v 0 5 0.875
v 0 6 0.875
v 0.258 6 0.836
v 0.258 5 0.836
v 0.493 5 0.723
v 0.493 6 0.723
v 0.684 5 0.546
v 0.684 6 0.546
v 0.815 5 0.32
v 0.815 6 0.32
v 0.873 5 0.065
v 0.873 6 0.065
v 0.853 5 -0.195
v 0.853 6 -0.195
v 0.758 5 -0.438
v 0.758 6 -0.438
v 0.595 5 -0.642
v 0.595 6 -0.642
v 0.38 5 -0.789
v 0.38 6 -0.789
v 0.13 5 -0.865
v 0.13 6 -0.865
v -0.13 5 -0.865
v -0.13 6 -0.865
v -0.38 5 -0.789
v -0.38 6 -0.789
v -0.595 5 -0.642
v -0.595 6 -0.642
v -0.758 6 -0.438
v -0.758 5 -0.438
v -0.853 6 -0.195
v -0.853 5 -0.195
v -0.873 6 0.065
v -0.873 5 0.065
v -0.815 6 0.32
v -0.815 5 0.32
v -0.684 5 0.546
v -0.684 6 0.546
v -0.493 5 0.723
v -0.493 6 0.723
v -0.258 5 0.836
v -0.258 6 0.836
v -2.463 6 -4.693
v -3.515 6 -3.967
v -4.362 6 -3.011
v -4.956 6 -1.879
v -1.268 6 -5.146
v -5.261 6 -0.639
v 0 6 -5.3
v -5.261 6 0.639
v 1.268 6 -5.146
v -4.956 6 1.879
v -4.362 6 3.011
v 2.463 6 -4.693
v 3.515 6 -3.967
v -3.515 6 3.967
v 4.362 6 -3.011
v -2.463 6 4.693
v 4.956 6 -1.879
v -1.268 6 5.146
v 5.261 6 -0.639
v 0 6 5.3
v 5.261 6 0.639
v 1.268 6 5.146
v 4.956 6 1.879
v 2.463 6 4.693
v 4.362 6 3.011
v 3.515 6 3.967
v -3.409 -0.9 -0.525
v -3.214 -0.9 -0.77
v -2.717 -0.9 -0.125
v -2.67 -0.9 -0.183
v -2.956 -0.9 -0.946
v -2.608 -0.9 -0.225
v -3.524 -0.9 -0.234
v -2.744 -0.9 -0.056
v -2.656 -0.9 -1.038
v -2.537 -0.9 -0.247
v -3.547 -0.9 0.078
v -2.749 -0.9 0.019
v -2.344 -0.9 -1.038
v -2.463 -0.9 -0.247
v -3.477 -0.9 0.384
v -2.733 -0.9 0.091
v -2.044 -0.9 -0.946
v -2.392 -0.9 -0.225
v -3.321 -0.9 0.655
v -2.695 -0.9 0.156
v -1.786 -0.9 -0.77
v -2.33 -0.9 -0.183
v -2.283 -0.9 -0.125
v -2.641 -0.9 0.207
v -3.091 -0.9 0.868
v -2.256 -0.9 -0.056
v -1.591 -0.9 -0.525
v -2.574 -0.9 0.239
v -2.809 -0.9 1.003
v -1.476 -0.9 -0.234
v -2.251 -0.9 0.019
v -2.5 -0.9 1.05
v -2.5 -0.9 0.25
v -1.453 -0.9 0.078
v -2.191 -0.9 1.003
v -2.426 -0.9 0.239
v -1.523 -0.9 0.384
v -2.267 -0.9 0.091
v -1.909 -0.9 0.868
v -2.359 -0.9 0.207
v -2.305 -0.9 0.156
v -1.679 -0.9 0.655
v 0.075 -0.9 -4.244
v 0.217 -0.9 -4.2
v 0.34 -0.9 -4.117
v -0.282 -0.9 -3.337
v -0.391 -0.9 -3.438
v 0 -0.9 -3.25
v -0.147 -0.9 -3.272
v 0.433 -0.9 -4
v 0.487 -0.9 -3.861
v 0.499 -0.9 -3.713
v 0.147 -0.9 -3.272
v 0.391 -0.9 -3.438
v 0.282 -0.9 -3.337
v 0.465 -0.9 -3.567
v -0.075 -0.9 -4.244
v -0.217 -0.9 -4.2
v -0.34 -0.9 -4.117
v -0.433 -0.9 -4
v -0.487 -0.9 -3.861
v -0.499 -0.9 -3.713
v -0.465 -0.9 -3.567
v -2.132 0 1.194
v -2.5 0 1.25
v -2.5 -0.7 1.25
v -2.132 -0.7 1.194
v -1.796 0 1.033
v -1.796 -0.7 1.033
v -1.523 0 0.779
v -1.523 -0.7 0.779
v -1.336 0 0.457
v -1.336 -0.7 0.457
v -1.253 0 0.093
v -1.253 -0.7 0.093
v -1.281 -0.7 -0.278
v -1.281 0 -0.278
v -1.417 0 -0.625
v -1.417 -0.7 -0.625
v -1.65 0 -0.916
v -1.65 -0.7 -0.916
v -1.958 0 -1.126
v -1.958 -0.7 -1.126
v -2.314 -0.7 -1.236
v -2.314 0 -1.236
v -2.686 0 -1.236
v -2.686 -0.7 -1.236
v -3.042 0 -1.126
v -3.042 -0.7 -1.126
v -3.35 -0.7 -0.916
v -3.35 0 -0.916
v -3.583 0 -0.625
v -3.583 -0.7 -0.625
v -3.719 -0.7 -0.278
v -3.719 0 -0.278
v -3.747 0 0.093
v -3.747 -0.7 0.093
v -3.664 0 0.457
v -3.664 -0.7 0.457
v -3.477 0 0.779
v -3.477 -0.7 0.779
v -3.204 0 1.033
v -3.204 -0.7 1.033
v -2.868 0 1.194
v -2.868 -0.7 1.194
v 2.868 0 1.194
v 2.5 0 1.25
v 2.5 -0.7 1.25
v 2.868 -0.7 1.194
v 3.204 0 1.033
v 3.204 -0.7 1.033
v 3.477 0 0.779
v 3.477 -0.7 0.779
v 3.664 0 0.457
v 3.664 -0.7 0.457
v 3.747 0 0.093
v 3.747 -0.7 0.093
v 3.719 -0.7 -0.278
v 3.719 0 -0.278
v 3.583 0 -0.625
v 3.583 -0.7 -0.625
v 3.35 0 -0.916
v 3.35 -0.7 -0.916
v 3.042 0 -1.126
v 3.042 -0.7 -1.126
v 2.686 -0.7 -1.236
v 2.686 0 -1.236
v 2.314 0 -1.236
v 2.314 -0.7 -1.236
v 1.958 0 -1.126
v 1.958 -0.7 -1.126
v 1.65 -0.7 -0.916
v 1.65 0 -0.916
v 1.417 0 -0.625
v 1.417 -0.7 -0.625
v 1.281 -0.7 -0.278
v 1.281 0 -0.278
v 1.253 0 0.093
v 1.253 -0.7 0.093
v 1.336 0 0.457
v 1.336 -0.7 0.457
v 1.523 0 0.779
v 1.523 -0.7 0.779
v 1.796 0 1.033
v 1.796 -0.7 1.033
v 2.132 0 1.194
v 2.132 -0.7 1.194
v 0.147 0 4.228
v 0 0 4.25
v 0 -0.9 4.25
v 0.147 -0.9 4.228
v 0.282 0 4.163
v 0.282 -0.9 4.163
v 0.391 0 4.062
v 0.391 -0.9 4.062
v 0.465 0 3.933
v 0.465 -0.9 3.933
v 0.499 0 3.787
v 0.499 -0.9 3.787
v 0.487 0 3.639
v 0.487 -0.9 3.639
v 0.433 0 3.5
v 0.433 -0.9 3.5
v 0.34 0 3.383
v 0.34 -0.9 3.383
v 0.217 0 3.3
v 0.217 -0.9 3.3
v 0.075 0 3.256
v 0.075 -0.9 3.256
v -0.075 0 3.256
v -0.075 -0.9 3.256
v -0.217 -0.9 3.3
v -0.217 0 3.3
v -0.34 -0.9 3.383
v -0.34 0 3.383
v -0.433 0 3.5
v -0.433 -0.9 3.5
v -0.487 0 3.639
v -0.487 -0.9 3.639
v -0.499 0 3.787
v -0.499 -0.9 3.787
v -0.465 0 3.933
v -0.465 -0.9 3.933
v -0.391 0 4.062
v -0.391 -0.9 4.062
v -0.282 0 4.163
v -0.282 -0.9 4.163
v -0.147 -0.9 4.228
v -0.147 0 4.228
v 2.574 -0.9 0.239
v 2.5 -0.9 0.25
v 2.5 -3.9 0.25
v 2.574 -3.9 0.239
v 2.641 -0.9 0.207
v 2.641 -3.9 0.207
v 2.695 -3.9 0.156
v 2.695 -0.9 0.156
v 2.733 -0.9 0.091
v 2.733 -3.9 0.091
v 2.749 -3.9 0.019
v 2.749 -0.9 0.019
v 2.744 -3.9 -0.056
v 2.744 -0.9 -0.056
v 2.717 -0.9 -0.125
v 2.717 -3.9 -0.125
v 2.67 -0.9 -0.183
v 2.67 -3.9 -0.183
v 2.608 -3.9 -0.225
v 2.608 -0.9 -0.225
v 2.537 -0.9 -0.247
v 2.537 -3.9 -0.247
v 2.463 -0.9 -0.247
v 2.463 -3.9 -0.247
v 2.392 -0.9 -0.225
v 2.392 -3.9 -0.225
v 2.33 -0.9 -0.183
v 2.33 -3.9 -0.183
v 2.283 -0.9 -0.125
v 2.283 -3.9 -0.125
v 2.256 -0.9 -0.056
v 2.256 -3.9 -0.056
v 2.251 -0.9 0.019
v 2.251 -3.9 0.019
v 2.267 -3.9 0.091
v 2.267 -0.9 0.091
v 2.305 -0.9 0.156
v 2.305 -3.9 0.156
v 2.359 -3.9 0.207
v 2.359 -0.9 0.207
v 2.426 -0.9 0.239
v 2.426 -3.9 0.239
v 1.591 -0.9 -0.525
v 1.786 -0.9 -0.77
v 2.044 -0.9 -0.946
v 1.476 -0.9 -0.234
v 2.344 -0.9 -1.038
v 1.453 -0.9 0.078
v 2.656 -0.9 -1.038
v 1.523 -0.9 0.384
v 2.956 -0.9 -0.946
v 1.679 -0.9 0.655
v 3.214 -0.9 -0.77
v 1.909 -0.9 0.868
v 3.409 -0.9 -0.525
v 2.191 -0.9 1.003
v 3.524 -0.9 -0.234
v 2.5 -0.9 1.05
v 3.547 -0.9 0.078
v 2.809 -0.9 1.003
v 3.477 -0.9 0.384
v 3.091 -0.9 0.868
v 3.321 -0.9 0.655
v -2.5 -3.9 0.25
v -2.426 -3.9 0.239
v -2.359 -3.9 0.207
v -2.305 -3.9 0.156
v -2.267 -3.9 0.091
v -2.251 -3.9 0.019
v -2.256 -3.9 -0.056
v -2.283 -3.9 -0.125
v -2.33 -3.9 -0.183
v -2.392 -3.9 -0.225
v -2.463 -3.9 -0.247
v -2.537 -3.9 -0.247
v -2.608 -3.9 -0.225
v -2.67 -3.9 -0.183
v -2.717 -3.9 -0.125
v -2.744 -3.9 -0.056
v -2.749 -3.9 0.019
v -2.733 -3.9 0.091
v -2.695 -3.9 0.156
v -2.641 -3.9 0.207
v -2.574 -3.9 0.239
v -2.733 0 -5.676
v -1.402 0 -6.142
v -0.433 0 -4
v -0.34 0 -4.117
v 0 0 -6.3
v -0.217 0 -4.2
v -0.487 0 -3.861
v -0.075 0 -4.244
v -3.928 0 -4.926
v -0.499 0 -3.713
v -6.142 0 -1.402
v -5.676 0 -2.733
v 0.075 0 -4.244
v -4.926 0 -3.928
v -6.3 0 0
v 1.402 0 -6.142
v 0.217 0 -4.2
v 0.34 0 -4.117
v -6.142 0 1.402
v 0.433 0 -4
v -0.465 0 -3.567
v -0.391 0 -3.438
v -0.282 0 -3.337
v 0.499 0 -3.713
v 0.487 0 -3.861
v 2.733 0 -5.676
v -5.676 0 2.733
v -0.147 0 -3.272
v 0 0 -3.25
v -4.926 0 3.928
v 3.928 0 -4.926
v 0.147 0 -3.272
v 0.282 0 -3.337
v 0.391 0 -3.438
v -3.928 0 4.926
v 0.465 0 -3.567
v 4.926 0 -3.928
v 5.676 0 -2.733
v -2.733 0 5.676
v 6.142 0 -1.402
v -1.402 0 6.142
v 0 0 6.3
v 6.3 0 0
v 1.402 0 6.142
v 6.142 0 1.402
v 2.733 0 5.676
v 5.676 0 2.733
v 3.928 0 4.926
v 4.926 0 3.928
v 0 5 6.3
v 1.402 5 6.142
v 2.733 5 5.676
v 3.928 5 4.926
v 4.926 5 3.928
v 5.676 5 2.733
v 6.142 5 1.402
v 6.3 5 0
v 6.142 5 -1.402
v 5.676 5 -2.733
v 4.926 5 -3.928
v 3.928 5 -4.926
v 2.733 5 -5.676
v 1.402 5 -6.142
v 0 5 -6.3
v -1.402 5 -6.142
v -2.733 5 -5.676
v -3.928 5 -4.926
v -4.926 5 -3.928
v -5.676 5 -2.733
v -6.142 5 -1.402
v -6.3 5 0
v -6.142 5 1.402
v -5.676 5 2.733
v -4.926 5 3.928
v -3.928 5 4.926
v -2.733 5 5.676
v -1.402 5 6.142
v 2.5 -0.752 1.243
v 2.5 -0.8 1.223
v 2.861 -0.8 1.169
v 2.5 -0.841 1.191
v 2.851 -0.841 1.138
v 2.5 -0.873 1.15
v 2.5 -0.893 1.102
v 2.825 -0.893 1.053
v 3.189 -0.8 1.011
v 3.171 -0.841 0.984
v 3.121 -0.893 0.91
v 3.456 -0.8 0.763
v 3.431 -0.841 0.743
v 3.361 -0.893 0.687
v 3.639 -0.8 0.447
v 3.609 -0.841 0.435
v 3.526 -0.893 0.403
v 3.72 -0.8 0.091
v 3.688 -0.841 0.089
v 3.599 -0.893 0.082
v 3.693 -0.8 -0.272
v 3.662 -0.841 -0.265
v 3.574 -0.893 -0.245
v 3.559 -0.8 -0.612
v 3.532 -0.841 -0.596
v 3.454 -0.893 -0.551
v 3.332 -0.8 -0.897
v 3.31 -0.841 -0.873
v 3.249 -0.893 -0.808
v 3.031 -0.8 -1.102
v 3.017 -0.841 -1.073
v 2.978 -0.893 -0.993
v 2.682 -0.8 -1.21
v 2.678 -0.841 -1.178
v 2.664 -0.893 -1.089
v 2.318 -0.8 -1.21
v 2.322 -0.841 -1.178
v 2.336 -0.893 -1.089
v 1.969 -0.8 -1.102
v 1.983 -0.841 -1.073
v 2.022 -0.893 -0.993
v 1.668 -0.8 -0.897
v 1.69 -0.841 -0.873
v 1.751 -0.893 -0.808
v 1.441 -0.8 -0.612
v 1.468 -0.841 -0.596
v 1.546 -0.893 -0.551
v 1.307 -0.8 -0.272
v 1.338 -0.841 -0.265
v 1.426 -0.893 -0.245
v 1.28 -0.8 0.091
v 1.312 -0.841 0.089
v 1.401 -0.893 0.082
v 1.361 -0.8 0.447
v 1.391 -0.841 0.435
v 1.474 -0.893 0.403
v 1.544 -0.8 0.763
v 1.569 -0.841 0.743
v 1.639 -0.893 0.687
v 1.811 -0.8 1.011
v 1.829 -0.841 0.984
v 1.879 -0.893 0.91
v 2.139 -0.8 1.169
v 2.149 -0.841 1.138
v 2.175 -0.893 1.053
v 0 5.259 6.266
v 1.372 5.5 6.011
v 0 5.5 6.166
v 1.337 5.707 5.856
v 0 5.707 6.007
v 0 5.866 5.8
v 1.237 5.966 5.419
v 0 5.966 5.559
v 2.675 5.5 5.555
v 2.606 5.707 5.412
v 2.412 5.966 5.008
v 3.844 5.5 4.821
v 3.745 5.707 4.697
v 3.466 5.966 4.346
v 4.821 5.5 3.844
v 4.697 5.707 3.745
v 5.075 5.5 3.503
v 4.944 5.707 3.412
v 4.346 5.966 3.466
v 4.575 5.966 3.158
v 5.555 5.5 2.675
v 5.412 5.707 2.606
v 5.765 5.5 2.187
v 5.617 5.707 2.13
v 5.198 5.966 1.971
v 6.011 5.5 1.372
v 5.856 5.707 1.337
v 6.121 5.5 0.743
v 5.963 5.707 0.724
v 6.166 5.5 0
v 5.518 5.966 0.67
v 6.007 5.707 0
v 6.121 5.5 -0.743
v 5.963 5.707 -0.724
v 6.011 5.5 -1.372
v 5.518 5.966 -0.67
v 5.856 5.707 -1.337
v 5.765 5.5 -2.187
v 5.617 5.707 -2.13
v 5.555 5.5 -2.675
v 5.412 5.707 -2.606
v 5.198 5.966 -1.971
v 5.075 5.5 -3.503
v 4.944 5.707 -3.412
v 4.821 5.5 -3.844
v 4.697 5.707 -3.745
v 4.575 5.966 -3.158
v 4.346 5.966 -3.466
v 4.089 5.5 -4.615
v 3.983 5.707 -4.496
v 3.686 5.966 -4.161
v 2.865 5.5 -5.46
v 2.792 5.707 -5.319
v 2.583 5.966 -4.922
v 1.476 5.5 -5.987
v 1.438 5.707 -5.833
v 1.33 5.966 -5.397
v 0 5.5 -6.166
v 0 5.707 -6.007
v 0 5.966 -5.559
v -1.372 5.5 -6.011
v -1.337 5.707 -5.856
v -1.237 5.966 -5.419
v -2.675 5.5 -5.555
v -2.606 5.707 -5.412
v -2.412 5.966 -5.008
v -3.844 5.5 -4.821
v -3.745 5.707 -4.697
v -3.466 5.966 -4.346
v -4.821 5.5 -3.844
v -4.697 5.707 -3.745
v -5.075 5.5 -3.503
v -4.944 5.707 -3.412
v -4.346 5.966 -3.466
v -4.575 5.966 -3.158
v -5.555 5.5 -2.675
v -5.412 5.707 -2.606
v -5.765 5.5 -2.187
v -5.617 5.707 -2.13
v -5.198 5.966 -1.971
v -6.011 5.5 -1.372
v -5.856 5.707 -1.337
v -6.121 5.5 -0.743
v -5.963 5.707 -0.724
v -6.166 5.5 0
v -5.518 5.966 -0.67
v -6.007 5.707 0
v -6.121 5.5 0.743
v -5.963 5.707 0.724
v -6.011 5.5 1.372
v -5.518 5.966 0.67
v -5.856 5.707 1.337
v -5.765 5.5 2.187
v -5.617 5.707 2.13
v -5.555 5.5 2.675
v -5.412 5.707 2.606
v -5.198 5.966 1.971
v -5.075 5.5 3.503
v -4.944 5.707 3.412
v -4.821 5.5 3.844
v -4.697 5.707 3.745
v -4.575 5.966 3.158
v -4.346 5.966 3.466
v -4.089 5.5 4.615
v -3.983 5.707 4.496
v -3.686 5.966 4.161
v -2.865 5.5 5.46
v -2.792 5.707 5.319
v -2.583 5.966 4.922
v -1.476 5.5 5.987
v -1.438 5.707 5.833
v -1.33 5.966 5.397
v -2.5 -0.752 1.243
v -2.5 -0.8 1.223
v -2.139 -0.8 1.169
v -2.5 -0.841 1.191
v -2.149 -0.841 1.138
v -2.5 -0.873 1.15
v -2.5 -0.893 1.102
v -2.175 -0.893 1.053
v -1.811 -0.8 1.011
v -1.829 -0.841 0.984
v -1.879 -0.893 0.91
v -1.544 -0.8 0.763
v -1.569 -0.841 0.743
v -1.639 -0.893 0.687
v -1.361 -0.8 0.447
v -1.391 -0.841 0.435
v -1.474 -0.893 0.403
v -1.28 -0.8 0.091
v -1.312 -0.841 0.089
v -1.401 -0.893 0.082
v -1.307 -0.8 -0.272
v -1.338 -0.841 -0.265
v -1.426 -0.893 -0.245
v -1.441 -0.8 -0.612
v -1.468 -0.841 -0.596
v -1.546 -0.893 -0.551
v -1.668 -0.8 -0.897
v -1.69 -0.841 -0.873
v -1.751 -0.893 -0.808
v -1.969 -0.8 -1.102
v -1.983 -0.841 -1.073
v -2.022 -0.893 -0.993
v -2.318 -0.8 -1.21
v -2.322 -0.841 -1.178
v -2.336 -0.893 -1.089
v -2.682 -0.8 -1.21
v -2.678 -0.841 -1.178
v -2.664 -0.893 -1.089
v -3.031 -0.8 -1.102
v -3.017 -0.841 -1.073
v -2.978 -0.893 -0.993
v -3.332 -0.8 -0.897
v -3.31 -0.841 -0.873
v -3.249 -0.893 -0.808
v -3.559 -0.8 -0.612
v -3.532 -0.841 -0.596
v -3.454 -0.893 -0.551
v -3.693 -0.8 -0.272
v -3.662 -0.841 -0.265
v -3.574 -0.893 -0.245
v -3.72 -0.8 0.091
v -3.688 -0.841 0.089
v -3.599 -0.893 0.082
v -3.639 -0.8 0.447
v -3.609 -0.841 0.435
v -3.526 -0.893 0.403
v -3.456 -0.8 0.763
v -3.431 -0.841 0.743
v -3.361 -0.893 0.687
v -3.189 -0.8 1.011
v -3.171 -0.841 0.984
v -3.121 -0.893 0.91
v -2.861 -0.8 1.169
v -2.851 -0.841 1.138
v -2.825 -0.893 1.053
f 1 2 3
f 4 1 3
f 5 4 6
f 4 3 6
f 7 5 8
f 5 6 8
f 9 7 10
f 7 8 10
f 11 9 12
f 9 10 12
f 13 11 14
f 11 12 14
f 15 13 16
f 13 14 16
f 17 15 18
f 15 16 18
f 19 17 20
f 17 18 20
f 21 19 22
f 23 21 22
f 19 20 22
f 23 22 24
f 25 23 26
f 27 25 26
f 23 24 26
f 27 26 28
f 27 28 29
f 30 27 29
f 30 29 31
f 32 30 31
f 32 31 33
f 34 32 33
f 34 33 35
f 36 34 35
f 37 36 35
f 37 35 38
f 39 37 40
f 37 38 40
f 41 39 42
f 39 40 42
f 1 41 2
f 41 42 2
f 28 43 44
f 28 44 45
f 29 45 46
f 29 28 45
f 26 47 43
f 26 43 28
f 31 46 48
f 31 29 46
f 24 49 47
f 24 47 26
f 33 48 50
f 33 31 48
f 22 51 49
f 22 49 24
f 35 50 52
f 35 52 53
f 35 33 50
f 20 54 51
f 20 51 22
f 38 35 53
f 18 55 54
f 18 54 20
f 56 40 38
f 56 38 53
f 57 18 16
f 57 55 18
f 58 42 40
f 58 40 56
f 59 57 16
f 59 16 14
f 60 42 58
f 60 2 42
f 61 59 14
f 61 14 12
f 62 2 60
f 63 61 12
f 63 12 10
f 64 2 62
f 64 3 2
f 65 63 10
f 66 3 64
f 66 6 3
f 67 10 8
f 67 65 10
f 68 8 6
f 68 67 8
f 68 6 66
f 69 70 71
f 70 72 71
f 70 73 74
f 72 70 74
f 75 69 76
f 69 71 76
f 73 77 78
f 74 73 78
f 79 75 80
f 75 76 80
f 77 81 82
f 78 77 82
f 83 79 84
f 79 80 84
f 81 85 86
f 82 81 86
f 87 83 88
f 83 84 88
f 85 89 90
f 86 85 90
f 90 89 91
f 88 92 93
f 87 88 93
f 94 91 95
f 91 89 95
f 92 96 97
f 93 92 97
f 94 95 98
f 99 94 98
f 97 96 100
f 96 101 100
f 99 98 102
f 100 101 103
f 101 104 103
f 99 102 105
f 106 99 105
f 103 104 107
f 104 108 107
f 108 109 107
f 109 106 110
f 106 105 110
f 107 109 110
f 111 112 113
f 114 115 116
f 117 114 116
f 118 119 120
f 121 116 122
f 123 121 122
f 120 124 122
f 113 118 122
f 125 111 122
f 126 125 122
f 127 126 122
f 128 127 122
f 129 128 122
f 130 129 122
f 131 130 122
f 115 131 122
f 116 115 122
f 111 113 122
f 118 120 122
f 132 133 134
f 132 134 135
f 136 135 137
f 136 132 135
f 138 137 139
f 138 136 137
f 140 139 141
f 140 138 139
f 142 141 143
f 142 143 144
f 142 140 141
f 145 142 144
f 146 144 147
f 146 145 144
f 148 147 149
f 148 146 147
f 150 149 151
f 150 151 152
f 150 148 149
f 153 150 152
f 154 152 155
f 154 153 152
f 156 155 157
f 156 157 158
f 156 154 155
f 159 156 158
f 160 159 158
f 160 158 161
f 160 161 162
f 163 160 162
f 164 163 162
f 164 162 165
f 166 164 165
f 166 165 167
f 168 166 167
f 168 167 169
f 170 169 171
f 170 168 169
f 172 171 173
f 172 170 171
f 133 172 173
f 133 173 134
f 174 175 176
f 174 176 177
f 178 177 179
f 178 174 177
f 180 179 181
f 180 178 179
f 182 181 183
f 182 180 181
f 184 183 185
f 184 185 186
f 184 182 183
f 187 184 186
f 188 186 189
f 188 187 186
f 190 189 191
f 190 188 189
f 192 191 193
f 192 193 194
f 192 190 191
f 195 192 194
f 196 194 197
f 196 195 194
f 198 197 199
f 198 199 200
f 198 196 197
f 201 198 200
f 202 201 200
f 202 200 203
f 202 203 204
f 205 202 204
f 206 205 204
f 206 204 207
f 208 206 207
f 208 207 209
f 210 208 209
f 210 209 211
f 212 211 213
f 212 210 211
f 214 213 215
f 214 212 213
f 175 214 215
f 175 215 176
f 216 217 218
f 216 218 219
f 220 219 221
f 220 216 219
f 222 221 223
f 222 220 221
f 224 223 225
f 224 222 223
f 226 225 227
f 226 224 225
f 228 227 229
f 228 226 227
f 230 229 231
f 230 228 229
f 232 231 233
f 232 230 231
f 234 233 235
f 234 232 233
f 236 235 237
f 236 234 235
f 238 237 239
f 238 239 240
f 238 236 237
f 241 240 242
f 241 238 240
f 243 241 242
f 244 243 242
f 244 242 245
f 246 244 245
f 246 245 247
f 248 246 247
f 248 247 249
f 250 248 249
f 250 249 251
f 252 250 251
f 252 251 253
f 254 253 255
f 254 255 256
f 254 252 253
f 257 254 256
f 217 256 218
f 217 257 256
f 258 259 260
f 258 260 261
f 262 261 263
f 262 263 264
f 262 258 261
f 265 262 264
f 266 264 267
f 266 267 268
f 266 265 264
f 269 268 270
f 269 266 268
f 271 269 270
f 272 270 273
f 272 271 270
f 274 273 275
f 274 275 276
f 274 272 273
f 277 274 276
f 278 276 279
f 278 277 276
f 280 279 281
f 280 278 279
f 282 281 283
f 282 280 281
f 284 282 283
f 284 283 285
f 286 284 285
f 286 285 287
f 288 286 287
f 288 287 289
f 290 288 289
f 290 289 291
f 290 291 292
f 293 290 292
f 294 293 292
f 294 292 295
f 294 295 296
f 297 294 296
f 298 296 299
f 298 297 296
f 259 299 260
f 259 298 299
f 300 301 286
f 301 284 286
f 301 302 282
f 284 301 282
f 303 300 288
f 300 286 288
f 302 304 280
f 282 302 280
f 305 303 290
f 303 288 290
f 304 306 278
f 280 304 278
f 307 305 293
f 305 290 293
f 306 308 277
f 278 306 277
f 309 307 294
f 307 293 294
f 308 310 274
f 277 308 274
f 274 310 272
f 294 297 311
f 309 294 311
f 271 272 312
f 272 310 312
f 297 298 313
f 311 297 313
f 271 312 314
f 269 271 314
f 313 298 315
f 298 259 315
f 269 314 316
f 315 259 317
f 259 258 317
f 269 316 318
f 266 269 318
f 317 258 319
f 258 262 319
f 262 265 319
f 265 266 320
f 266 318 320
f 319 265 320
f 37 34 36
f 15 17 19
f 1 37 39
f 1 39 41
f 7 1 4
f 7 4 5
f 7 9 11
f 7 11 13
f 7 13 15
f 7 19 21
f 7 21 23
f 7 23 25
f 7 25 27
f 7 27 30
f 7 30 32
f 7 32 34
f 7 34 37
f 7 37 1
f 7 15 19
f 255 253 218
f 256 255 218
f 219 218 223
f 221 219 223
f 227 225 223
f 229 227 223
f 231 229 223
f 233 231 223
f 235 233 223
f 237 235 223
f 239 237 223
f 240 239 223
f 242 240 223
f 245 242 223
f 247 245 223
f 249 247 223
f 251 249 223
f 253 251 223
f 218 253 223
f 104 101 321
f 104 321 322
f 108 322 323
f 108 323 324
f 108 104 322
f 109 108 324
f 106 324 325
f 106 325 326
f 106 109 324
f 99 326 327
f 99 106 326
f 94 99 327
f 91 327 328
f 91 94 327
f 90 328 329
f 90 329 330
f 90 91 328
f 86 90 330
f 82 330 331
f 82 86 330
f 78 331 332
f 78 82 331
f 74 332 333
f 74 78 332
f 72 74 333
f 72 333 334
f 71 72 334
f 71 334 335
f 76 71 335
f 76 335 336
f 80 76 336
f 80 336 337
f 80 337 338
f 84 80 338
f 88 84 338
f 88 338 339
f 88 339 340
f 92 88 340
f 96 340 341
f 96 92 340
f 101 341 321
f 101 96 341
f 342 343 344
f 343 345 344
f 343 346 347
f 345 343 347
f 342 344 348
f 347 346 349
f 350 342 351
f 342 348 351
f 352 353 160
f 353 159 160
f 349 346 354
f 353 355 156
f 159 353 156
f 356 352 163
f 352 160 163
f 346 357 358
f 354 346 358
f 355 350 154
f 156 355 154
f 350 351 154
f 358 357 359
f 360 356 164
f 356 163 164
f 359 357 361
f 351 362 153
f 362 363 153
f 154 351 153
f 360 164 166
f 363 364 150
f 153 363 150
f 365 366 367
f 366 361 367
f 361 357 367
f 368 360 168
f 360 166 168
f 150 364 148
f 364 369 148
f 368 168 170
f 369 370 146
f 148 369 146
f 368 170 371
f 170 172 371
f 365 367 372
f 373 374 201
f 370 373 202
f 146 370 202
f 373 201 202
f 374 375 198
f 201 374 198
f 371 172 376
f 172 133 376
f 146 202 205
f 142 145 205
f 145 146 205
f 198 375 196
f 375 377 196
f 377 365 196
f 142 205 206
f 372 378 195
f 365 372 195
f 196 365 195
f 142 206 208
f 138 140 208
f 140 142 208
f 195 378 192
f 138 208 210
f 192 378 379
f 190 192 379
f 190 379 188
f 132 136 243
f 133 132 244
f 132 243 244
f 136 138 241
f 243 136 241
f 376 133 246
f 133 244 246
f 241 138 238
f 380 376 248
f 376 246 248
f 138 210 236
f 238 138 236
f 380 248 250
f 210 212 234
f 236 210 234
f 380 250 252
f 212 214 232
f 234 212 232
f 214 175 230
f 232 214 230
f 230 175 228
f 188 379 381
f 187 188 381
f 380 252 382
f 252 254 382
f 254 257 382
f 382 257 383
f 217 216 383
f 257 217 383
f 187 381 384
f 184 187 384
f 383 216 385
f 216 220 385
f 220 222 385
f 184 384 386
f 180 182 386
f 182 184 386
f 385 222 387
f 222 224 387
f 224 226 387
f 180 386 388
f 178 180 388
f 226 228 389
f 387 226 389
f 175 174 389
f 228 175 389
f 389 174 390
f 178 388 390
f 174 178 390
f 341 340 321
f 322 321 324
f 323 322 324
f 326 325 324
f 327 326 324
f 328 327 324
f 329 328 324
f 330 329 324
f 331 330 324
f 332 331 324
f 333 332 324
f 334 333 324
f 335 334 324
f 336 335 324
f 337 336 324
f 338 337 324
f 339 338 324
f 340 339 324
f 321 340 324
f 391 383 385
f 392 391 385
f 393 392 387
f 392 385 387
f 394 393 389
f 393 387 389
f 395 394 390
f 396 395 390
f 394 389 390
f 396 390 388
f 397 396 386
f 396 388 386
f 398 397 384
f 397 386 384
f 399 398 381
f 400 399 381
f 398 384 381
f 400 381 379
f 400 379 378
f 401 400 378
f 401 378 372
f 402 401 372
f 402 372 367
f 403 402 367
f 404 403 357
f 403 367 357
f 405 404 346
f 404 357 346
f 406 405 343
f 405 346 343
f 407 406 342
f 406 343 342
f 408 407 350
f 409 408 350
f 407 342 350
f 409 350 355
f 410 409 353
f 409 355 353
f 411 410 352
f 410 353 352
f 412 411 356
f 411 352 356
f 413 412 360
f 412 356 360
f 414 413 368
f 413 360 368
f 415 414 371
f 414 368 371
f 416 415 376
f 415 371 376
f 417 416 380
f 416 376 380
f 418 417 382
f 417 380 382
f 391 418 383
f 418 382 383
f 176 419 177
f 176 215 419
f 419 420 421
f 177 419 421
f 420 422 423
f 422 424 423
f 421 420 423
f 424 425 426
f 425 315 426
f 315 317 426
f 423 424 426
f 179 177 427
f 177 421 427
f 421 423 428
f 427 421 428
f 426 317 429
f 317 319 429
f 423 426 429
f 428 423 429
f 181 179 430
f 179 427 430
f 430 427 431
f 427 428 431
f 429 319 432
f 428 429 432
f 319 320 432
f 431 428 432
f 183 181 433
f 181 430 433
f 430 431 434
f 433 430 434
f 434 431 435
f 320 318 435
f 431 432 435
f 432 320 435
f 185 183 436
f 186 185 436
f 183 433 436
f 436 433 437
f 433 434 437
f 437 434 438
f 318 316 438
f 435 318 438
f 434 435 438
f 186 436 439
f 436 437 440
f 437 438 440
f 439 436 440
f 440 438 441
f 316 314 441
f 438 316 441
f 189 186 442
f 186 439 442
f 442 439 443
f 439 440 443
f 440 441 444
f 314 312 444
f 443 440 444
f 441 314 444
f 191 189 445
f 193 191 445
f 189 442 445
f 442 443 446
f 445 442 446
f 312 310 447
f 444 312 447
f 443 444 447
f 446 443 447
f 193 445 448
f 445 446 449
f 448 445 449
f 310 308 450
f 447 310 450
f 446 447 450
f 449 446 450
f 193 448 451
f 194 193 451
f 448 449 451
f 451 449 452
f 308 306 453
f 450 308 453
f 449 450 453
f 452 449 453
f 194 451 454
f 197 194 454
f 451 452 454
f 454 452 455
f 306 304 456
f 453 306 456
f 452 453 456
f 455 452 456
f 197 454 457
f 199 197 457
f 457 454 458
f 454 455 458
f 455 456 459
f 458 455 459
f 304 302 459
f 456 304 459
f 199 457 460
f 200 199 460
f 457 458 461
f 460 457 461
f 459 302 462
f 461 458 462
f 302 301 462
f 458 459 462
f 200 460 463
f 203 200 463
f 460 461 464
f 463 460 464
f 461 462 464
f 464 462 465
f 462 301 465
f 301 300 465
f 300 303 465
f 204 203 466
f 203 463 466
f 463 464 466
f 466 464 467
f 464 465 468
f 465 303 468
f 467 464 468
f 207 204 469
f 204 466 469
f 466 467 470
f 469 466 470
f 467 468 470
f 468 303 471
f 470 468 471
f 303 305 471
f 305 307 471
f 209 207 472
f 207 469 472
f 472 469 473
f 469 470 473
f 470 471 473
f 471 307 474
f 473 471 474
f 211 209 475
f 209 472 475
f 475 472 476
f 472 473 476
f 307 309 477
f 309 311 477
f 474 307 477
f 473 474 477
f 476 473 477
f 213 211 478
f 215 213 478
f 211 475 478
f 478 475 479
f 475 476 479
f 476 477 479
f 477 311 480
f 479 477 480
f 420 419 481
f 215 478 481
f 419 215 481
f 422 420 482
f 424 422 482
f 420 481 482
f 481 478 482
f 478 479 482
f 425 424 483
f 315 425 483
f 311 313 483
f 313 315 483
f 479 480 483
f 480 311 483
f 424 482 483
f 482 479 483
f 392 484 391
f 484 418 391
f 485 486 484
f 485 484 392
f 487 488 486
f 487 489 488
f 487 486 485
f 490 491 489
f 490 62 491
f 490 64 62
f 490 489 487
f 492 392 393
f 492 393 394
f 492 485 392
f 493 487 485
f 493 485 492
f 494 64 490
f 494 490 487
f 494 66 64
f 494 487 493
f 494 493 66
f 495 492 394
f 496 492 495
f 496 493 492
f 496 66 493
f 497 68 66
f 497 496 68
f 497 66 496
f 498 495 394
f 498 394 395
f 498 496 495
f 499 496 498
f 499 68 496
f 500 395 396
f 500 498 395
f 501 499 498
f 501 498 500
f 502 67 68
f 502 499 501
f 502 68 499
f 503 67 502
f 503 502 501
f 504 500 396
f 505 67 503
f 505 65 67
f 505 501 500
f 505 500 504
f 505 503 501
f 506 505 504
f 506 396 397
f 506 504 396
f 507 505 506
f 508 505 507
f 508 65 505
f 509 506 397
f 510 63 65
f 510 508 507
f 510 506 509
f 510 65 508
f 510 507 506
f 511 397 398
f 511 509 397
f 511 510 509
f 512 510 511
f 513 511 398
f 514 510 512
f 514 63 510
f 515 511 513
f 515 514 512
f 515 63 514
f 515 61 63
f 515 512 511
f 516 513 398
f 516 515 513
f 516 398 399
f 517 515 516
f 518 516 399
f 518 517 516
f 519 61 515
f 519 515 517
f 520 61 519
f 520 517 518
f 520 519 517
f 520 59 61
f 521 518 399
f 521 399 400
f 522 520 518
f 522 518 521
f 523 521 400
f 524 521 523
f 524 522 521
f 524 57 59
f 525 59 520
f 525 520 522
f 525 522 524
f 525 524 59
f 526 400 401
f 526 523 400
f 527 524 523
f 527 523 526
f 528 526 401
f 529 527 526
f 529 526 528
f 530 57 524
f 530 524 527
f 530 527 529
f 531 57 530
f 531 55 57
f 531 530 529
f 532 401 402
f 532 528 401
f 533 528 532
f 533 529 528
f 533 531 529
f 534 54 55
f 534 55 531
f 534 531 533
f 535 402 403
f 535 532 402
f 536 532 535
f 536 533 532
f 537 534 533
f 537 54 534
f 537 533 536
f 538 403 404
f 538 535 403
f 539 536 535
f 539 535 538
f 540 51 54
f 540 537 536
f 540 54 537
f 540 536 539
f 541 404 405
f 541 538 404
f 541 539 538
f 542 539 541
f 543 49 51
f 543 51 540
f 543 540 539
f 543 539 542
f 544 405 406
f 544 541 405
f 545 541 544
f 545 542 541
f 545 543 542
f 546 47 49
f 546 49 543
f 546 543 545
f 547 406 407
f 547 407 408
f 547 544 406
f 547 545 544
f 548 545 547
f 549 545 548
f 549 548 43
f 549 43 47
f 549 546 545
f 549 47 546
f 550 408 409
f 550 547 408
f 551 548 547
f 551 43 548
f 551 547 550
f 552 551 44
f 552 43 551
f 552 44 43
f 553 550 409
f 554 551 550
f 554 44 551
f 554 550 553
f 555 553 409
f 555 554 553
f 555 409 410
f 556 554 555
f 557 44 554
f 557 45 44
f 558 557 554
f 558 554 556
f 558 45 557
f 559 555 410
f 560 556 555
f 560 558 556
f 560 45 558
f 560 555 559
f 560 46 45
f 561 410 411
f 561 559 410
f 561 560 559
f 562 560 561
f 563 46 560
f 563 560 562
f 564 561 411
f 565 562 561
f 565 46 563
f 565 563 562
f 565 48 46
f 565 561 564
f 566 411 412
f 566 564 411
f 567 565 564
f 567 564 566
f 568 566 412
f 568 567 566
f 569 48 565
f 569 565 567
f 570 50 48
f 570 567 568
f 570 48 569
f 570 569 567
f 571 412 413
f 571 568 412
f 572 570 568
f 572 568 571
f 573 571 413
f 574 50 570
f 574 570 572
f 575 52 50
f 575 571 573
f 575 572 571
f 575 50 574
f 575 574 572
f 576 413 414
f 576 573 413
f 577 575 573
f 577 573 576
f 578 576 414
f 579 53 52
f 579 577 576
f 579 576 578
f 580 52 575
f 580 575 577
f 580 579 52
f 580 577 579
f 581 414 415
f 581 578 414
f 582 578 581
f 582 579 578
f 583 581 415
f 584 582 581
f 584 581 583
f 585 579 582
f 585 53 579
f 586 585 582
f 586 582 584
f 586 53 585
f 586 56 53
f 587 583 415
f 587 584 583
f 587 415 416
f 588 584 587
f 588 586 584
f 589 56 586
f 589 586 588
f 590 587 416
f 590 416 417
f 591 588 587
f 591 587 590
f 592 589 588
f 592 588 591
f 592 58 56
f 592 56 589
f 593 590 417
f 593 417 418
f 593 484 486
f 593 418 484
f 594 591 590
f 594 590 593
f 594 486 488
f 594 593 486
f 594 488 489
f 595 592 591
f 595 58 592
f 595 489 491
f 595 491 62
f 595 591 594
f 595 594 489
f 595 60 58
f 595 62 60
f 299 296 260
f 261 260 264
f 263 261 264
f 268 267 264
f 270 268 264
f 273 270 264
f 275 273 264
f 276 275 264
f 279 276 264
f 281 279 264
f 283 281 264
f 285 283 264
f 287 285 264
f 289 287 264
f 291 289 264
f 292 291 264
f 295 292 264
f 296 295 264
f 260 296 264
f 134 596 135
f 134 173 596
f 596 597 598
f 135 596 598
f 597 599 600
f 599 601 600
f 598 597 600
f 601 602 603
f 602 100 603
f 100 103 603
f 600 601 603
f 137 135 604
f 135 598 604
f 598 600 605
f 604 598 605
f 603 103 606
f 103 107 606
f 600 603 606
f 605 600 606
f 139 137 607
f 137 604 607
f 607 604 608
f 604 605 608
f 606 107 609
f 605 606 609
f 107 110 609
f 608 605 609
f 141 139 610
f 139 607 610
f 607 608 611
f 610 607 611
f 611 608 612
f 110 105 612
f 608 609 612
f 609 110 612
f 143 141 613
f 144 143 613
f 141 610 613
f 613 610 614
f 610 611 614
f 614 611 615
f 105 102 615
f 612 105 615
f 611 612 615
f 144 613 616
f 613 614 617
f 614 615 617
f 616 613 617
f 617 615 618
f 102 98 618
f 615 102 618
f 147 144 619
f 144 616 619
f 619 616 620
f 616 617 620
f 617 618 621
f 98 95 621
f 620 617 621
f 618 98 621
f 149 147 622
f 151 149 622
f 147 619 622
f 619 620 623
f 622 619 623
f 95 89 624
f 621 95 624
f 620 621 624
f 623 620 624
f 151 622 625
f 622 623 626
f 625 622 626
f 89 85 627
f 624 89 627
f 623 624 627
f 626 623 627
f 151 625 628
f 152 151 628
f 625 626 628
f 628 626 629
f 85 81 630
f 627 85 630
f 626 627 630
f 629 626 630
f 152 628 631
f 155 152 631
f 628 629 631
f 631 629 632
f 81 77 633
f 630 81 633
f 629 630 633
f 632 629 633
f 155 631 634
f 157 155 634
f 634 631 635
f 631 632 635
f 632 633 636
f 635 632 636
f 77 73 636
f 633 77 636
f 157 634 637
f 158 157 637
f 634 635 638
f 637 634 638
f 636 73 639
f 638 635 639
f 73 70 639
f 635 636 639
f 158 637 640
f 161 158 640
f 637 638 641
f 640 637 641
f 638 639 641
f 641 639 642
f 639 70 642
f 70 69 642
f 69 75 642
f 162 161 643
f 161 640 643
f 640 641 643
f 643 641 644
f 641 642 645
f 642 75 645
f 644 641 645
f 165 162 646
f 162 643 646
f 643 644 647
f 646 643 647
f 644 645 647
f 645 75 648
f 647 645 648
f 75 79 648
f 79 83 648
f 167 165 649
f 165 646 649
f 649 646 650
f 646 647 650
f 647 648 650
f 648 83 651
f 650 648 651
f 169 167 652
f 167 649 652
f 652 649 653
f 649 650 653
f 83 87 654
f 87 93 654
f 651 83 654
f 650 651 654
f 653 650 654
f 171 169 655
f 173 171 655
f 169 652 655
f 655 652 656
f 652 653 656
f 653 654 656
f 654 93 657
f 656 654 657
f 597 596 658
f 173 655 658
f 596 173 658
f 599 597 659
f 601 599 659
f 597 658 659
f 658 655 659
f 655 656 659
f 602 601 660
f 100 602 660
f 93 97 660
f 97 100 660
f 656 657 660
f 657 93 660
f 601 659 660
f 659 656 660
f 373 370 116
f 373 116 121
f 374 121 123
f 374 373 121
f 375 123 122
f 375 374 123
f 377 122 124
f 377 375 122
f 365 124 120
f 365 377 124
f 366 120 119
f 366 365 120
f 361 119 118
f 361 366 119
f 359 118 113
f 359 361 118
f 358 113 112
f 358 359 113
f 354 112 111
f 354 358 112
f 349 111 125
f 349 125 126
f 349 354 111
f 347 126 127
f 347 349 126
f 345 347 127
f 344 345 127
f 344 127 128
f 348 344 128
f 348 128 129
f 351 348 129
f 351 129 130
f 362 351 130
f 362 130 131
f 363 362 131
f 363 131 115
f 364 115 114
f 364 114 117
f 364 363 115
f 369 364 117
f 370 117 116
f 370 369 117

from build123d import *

# Parameters (mm, degrees)
SKETCH_1_R          = 6.3
SKETCH_1_R_2        = 1.25
SKETCH_1_R_3        = 0.5
SKETCH_1_R_4        = 0.25
SKETCH_1_R_5        = 0.875244423
EXTRUDE_1_DEPTH     = 6
FILLET_1_R          = 1
CUT_EXTRUDE_START   = 6
SKETCH_1_3_R        = 0.875244423
CUT_EXTRUDE_1_DEPTH = 1
SKETCH_1_4_R        = 1.25
SKETCH_1_4_R_2      = 0.25
SKETCH_1_4_R_3      = 0.5
EXTRUDE_2_DEPTH     = 0.9
FILLET_2_R          = 0.2
EXTRUDE_START       = -0.9
SKETCH_1_5_R        = 0.25
EXTRUDE_3_DEPTH     = 3


with BuildPart() as part:
    # Эскиз1 → Бобышка-Вытянуть1 (new body)
    # profile 1 of 8: a face of its own
    with BuildSketch(Plane(origin=(0, 0, 0), x_dir=(1, 0, 0), z_dir=(0, 1, 0))):
        with Locations(Location((0, 0, 0), (0, 0, 270))):
            Circle(SKETCH_1_R)
        with Locations((-2.5, 0)):
            Circle(SKETCH_1_R_2, mode=Mode.SUBTRACT)
        with Locations((2.5, 0)):
            Circle(SKETCH_1_R_2, mode=Mode.SUBTRACT)
        with Locations((0, 3.75)):
            Circle(SKETCH_1_R_3, mode=Mode.SUBTRACT)
        with Locations((0, -3.75)):
            Circle(SKETCH_1_R_3, mode=Mode.SUBTRACT)
    # profile 2 of 8: a face of its own
    with BuildSketch(Plane(origin=(0, 0, 0), x_dir=(1, 0, 0), z_dir=(0, 1, 0))):
        with Locations((-2.5, 0)):
            Circle(SKETCH_1_R_2)
        with Locations((-2.5, 0)):
            Circle(SKETCH_1_R_4, mode=Mode.SUBTRACT)
    # profile 3 of 8: a face of its own
    with BuildSketch(Plane(origin=(0, 0, 0), x_dir=(1, 0, 0), z_dir=(0, 1, 0))):
        with Locations((-2.5, 0)):
            Circle(SKETCH_1_R_4)
    # profile 4 of 8: a face of its own
    with BuildSketch(Plane(origin=(0, 0, 0), x_dir=(1, 0, 0), z_dir=(0, 1, 0))):
        with Locations((2.5, 0)):
            Circle(SKETCH_1_R_2)
        with Locations((2.5, 0)):
            Circle(SKETCH_1_R_4, mode=Mode.SUBTRACT)
    # profile 5 of 8: a face of its own
    with BuildSketch(Plane(origin=(0, 0, 0), x_dir=(1, 0, 0), z_dir=(0, 1, 0))):
        with Locations((2.5, 0)):
            Circle(SKETCH_1_R_4)
    # profile 6 of 8: a face of its own
    with BuildSketch(Plane(origin=(0, 0, 0), x_dir=(1, 0, 0), z_dir=(0, 1, 0))):
        with Locations((0, 3.75)):
            Circle(SKETCH_1_R_3)
    # profile 7 of 8: a face of its own
    with BuildSketch(Plane(origin=(0, 0, 0), x_dir=(1, 0, 0), z_dir=(0, 1, 0))):
        with Locations((0, -3.75)):
            Circle(SKETCH_1_R_3)
    # profile 8 of 8: a face of its own
    with BuildSketch(Plane(origin=(0, 0, 0), x_dir=(1, 0, 0), z_dir=(0, 1, 0))):
        Circle(SKETCH_1_R_5)
    extrude(amount=EXTRUDE_1_DEPTH)

    # Скругление1
    fillet_1_edges = [part.edges().sort_by_distance(p)[0] for p in [
        (0, 6, -6.3),
    ]]
    fillet(fillet_1_edges, radius=FILLET_1_R)

    # Эскиз1<3> → Вырез-Вытянуть1 (cut)
    with BuildSketch(Plane(origin=(0, 0, 0), x_dir=(1, 0, 0), z_dir=(0, 1, 0)).offset(CUT_EXTRUDE_START)):
        with Locations(Location((0, 0, 0), (0, 0, 270))):
            Circle(SKETCH_1_3_R)
    extrude(amount=-CUT_EXTRUDE_1_DEPTH, mode=Mode.SUBTRACT)

    # Эскиз1<4> → Бобышка-Вытянуть2 (add)
    # profile 1 of 6: a face of its own
    with BuildSketch(Plane(origin=(0, 0, 0), x_dir=(1, 0, 0), z_dir=(0, 1, 0))):
        with Locations(Location((-2.5, 0, 0), (0, 0, 270))):
            Circle(SKETCH_1_4_R)
        with Locations((-2.5, 0)):
            Circle(SKETCH_1_4_R_2, mode=Mode.SUBTRACT)
    # profile 2 of 6: a face of its own
    with BuildSketch(Plane(origin=(0, 0, 0), x_dir=(1, 0, 0), z_dir=(0, 1, 0))):
        with Locations(Location((0, -3.75, 0), (0, 0, 270))):
            Circle(SKETCH_1_4_R_3)
    # profile 3 of 6: a face of its own
    with BuildSketch(Plane(origin=(0, 0, 0), x_dir=(1, 0, 0), z_dir=(0, 1, 0))):
        with Locations(Location((2.5, 0, 0), (0, 0, 270))):
            Circle(SKETCH_1_4_R)
        with Locations((2.5, 0)):
            Circle(SKETCH_1_4_R_2, mode=Mode.SUBTRACT)
    # profile 4 of 6: a face of its own
    with BuildSketch(Plane(origin=(0, 0, 0), x_dir=(1, 0, 0), z_dir=(0, 1, 0))):
        with Locations((2.5, 0)):
            Circle(SKETCH_1_4_R_2)
    # profile 5 of 6: a face of its own
    with BuildSketch(Plane(origin=(0, 0, 0), x_dir=(1, 0, 0), z_dir=(0, 1, 0))):
        with Locations((-2.5, 0)):
            Circle(SKETCH_1_4_R_2)
    # profile 6 of 6: a face of its own
    with BuildSketch(Plane(origin=(0, 0, 0), x_dir=(1, 0, 0), z_dir=(0, 1, 0))):
        with Locations(Location((0, 3.75, 0), (0, 0, 270))):
            Circle(SKETCH_1_4_R_3)
    extrude(amount=-EXTRUDE_2_DEPTH)

    # Скругление2
    fillet_2_edges = [part.edges().sort_by_distance(p)[0] for p in [
        (2.5, -0.9, -1.25),
        (-2.5, -0.9, -1.25),
    ]]
    fillet(fillet_2_edges, radius=FILLET_2_R)

    # Эскиз1<5> → Бобышка-Вытянуть3 (add)
    with BuildSketch(Plane(origin=(0, 0, 0), x_dir=(1, 0, 0), z_dir=(0, 1, 0)).offset(EXTRUDE_START)):
        with Locations(Location((-2.5, 0, 0), (0, 0, 270))):
            Circle(SKETCH_1_5_R)
        with Locations(Location((2.5, 0, 0), (0, 0, 270))):
            Circle(SKETCH_1_5_R)
    extrude(amount=-EXTRUDE_3_DEPTH)


solid = part.part
